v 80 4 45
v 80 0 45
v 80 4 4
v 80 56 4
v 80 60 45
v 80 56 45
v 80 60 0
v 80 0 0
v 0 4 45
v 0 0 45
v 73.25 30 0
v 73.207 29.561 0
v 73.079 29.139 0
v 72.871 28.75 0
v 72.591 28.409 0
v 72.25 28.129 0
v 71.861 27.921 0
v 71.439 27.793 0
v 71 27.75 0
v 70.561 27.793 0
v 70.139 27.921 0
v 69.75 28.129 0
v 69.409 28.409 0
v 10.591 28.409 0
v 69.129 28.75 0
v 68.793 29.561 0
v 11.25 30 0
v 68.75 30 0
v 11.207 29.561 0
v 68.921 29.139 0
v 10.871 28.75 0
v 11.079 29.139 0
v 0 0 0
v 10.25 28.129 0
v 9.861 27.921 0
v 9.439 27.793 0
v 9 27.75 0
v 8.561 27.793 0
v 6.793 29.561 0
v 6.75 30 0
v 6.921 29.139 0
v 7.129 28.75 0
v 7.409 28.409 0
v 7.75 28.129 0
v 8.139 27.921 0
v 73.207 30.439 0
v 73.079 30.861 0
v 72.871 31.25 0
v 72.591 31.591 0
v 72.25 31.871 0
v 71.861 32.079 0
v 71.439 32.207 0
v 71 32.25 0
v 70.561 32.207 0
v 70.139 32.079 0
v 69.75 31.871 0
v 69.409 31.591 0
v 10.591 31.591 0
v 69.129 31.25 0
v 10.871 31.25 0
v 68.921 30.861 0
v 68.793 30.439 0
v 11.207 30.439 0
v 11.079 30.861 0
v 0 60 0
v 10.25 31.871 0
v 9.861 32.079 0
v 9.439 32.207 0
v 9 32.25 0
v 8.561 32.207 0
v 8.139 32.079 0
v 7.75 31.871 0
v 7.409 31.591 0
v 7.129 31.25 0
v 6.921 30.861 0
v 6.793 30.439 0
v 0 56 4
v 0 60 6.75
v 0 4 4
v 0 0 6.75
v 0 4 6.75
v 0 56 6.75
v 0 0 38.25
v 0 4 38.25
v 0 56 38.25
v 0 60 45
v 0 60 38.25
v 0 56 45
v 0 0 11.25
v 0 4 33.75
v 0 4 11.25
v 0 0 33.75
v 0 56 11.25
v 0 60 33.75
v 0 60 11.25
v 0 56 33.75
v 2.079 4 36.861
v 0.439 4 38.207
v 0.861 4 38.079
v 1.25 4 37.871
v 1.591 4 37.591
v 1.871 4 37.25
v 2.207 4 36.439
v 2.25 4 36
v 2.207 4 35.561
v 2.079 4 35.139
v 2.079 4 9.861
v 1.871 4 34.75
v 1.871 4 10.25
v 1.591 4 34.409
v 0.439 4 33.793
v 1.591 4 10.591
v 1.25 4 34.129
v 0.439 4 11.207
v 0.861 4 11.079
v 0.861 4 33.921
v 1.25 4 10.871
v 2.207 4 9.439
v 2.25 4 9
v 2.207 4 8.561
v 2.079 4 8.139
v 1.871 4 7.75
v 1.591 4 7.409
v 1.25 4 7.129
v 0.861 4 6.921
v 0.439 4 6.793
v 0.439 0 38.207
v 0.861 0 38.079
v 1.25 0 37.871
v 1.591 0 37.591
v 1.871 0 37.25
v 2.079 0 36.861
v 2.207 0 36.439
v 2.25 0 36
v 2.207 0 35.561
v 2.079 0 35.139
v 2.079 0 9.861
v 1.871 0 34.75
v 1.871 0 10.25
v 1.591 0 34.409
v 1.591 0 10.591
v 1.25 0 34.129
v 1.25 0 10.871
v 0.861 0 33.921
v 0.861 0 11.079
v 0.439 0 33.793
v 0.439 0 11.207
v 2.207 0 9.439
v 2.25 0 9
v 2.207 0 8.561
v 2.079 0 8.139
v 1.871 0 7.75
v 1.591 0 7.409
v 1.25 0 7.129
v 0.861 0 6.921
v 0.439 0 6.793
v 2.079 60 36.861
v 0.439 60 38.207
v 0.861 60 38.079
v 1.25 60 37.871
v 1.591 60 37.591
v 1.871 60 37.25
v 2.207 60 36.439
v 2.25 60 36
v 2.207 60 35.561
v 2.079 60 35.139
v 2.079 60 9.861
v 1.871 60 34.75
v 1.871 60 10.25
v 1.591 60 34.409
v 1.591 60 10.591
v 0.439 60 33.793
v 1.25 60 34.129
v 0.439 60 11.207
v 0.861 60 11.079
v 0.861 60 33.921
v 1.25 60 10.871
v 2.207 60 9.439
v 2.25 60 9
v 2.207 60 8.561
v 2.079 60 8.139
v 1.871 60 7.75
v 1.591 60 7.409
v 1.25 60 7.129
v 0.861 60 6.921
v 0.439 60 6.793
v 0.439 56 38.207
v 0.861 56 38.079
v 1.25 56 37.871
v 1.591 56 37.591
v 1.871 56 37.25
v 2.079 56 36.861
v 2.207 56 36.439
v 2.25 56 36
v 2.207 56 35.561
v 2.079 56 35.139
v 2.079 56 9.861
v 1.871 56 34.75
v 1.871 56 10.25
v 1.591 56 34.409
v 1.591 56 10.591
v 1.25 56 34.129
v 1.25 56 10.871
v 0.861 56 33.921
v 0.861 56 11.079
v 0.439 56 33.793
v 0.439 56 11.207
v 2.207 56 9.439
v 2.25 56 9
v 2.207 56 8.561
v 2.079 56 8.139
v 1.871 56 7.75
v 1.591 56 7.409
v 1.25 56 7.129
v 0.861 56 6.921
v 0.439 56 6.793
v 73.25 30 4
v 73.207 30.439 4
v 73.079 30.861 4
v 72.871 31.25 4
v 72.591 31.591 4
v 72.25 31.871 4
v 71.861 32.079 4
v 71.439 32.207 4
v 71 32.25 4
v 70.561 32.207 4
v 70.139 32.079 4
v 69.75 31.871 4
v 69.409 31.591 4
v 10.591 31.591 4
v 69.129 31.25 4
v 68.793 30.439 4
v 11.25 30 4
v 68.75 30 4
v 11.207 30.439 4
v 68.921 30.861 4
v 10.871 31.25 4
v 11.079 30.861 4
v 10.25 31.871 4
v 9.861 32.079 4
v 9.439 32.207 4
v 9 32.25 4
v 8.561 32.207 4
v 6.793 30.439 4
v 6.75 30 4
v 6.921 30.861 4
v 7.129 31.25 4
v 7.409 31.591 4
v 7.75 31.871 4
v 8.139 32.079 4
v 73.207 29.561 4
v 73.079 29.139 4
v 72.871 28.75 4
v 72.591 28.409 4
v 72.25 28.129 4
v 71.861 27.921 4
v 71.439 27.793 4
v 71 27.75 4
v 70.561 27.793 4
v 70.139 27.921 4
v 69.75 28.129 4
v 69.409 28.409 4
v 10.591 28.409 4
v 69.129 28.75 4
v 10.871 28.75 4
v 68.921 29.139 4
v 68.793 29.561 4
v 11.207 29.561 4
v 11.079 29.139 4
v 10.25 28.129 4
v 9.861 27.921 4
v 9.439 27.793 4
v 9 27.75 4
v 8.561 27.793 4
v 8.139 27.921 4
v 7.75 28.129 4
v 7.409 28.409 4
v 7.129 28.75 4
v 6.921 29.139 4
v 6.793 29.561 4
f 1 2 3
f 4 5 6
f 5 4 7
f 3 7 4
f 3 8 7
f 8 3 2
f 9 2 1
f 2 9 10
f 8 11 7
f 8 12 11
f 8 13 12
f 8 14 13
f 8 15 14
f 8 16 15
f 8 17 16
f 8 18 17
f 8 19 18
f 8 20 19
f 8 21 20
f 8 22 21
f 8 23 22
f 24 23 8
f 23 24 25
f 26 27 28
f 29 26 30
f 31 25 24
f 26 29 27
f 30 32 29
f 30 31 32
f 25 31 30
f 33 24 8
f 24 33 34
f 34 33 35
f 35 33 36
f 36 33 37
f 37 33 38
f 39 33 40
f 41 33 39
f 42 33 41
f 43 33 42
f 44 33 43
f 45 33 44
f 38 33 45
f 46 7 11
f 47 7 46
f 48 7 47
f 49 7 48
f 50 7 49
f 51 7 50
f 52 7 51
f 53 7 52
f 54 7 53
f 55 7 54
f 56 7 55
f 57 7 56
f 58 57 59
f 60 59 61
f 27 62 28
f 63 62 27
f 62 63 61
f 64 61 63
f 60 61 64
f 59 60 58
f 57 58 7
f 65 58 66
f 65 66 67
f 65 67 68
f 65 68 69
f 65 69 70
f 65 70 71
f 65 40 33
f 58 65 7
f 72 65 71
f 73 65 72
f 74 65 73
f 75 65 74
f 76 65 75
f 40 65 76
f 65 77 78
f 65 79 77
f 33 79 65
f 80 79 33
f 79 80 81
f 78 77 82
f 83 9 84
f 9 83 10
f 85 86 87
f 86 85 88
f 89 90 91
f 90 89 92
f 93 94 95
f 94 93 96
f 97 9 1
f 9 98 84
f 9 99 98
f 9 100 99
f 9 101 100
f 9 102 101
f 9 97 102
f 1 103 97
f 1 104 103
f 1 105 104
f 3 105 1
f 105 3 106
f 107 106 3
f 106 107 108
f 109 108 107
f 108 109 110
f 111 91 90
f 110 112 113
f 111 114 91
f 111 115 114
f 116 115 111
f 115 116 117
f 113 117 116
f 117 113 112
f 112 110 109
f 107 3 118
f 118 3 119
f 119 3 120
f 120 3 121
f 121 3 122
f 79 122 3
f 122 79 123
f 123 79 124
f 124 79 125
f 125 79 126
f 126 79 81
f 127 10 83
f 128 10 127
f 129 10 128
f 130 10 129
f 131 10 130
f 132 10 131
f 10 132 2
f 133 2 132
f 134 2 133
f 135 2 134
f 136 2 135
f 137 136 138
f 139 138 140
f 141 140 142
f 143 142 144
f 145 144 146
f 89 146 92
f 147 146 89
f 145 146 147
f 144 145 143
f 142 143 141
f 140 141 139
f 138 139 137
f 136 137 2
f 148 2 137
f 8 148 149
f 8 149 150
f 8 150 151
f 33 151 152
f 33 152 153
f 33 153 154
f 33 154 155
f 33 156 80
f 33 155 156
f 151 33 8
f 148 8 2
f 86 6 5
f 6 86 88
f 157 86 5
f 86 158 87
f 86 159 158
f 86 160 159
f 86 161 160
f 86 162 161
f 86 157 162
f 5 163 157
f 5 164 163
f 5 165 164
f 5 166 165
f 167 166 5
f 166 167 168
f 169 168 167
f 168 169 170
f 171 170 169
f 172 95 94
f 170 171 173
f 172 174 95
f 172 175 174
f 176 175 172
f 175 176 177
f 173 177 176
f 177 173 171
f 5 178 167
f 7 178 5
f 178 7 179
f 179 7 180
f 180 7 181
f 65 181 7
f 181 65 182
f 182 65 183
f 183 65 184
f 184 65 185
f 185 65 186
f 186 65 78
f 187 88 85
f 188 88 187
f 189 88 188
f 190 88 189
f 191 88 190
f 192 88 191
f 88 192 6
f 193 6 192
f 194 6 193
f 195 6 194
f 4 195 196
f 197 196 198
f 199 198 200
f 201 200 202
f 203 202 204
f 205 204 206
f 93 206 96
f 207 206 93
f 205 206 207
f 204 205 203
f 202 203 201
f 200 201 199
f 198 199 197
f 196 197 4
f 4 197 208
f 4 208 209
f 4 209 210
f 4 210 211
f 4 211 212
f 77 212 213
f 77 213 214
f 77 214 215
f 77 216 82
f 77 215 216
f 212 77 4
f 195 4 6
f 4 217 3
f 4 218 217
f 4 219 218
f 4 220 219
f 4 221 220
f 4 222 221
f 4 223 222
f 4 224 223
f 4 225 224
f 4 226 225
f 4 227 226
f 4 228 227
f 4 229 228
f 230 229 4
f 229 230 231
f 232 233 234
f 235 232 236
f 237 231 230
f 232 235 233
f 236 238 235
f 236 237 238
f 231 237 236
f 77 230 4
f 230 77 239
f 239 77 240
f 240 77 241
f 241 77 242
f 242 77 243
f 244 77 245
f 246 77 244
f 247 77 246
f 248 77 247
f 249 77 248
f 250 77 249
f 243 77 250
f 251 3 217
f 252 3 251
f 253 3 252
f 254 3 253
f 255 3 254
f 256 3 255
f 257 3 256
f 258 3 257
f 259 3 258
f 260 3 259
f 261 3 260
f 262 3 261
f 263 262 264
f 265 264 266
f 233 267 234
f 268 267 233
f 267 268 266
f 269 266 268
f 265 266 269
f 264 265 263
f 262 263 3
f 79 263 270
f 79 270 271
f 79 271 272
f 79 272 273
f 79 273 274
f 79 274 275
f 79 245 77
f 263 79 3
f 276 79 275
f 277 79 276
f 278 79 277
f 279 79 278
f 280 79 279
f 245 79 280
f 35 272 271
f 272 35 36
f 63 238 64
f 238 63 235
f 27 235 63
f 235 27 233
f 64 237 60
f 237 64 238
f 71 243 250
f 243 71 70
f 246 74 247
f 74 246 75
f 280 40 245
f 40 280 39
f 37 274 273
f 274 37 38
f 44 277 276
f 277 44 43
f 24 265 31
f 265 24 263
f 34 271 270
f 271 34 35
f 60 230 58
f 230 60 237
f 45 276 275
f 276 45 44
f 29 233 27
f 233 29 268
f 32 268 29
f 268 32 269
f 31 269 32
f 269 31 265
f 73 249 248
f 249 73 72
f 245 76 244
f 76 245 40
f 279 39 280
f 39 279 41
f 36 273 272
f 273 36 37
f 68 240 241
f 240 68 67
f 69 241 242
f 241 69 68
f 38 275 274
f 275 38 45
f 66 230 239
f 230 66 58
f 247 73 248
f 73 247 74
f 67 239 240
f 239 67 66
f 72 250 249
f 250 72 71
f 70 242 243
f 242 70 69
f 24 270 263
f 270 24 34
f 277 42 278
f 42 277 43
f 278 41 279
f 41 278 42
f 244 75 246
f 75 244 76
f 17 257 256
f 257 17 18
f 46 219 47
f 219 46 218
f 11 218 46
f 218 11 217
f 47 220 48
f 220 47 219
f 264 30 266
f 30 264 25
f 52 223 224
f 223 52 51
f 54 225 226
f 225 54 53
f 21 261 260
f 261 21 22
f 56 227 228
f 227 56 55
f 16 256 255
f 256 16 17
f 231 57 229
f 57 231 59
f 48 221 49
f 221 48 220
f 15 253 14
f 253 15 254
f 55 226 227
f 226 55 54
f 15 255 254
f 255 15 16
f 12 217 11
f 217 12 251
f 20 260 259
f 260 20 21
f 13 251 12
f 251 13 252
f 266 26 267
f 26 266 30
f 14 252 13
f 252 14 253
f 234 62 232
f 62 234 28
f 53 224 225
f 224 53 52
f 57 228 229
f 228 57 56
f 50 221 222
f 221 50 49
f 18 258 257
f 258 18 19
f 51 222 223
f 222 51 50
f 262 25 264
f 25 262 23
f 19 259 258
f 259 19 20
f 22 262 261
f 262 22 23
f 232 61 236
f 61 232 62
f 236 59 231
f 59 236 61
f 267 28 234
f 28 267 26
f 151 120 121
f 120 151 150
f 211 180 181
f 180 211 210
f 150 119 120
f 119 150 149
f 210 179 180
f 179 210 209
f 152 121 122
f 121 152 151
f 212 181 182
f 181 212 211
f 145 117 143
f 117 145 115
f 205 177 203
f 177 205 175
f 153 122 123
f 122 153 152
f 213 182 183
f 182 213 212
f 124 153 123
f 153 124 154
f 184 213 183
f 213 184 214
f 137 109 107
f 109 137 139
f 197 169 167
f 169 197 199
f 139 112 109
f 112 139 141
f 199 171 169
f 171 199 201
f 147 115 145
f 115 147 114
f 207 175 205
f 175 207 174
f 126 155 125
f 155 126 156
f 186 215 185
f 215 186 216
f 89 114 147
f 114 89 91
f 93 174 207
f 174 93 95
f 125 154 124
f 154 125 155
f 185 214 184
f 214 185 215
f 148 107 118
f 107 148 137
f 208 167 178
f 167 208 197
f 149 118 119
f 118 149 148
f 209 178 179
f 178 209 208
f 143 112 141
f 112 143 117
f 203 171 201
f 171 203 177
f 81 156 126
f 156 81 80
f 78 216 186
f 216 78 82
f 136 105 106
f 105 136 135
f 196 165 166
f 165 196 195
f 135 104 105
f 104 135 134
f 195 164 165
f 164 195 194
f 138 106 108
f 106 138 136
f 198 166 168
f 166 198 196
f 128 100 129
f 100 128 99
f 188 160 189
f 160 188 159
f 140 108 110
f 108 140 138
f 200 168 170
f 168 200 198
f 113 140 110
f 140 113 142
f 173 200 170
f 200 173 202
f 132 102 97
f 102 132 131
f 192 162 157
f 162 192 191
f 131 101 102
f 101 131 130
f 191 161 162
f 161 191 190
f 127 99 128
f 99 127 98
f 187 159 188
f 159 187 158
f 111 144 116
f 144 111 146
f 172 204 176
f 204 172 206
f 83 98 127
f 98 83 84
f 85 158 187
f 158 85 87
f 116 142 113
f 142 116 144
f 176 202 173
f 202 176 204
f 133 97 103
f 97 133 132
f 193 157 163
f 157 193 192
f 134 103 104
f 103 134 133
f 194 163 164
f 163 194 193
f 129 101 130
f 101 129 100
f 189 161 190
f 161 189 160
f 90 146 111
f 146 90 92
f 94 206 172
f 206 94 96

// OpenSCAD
$fn = 32;

// ----------------------------------------------------------------------
// U-bracket: 80 x 60 x 45 mm
// ----------------------------------------------------------------------

// --- parameters (mm) ---
rail_len = 80;            // outer length, X
jaw_w = 60;               // outer width, Y
jaw_h = 45;               // upright height, Z
web_t = 4;                // wall thickness
hole_d = 4.5;             // clearance for M4

module hole_z(px, py) {
  translate([px, py, -0.5]) cylinder(h = web_t + 1, d = hole_d);
}
module hole_y_pz(pz) {
  /* through both uprights along Y */
  translate([0, -0.5, pz]) rotate([-90, 0, 0]) cylinder(h = jaw_w + 1, d = hole_d);
}

module base() {
  cube([rail_len, jaw_w, web_t]);
}

module uprights() {
  cube([rail_len, web_t, jaw_h]);
  translate([0, jaw_w - web_t, 0]) cube([rail_len, web_t, jaw_h]);
}

difference() {
  union() {
    base();
    uprights();
  }
  hole_z(9, 30);
  hole_z(71, 30);
  hole_y_pz(9);
  hole_y_pz(36);
}
